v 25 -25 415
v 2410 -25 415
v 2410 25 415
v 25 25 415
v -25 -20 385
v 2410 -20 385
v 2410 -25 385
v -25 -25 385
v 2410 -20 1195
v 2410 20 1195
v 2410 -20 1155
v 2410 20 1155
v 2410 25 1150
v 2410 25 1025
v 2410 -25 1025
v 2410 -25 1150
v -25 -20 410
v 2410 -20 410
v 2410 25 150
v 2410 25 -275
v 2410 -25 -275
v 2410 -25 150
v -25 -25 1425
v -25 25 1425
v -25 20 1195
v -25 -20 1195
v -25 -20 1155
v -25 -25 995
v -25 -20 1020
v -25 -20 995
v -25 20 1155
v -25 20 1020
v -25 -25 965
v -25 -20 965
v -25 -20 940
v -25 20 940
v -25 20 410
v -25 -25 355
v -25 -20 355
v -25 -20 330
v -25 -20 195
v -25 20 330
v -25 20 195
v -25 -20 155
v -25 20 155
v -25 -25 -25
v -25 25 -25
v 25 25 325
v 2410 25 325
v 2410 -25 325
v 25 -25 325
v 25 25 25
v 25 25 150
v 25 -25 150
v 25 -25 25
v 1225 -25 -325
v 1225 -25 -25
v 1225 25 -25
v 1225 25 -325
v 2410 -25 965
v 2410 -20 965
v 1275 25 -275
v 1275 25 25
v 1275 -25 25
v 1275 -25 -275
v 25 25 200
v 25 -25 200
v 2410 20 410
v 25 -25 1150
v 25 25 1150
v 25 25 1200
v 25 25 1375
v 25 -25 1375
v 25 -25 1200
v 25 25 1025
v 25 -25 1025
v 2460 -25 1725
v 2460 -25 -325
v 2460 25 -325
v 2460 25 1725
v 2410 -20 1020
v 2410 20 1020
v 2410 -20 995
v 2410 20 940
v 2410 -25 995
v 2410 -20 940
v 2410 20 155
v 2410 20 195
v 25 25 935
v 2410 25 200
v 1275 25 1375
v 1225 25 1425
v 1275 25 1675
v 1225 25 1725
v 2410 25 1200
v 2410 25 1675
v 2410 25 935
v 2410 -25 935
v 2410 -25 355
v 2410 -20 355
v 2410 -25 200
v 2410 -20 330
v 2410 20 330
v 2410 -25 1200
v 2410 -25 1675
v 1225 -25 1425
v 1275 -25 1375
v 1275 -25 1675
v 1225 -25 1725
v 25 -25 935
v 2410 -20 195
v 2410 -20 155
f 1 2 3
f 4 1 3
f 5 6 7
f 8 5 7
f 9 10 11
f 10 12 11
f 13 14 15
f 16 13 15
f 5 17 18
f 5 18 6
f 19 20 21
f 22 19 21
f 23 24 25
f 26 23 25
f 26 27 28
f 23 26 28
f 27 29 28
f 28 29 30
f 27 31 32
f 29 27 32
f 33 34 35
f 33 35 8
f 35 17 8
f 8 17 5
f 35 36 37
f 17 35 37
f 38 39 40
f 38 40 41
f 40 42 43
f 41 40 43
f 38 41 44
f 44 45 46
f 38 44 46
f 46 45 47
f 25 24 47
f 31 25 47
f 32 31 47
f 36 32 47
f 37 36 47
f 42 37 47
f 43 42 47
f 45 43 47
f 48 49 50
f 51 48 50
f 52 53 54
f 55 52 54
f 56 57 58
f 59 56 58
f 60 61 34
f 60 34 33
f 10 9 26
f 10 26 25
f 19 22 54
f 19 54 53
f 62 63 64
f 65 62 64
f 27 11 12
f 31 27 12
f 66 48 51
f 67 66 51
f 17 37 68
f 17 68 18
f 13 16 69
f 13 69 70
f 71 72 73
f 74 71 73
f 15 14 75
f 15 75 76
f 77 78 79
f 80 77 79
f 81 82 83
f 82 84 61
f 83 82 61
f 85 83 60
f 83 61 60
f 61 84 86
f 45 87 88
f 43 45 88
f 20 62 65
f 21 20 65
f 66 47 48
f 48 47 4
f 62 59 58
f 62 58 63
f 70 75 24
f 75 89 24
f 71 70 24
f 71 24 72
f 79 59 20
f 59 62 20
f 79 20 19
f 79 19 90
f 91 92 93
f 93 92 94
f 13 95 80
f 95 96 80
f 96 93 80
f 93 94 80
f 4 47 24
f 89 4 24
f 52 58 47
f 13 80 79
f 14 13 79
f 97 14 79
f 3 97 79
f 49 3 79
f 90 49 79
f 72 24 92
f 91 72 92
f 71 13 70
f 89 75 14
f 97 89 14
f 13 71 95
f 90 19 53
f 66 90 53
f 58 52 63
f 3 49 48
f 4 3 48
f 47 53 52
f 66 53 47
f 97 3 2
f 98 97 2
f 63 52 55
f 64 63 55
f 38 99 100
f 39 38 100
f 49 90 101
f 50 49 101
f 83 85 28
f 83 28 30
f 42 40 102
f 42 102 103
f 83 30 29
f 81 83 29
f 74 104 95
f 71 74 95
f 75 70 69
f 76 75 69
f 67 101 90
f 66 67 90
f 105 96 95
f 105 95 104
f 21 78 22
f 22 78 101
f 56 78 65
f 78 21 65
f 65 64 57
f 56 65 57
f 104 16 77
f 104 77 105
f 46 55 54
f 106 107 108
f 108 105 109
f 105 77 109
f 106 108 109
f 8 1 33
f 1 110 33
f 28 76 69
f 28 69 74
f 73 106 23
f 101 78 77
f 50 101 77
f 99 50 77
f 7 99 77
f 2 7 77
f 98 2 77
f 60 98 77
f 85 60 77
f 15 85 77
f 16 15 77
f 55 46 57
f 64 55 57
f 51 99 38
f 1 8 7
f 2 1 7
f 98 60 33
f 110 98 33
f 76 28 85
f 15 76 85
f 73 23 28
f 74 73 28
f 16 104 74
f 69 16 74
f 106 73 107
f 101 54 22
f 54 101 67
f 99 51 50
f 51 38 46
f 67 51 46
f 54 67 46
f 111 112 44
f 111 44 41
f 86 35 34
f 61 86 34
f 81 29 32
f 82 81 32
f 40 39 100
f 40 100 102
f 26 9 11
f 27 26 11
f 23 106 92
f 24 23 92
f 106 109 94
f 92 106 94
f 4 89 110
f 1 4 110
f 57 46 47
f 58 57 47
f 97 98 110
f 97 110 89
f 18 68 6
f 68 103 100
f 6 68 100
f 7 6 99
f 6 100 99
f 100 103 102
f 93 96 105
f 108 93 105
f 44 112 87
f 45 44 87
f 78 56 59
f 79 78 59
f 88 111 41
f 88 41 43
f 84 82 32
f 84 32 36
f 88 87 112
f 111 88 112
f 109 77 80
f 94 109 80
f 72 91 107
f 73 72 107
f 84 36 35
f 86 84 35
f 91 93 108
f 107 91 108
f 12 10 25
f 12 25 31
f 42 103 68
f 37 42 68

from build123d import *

# Parameters (mm, degrees)
SKETCH2_W           = 50
SKETCH2_H           = 50
BOSS_EXTRUDE1_DEPTH = 2435
CUT_EXTRUDE1_DEPTH  = 80
SKETCH6_W           = 50
SKETCH6_H           = 50
SKETCH6_W_2         = 40
SKETCH6_H_2         = 40
BOSS_EXTRUDE2_DEPTH = 2435
SKETCH7_W           = 40
SKETCH7_H           = 40
CUT_EXTRUDE2_DEPTH  = 80


with BuildPart() as part:
    # Sweep1: sweep along a path in Sketch1
    with BuildLine(Plane(origin=(0, 0, 0), x_dir=(1, 0, 0), z_dir=(0, 1, 0))) as sweep1_path:
        Line((1250, -1400), (1250, -1700))
        Line((1250, -1700), (2435, -1700))
        Line((2435, -1700), (2435, 300))
        Line((2435, 300), (1250, 300))
        Line((1250, 300), (1250, 0))
        Line((1250, 0), (0, 0))
        Line((0, 0), (0, -1400))
        Line((0, -1400), (1250, -1400))
    # Sketch2 → Sweep1 (sweep)
    with BuildSketch(Plane(origin=(0, 0, 0), x_dir=(0, 0, -1), z_dir=(1, 0, 0))):
        Rectangle(SKETCH2_W, SKETCH2_H)
    sweep(path=sweep1_path.line, transition=Transition.RIGHT)

    # Sketch3 → Boss-Extrude1 (add)
    with BuildSketch(Plane.ZY.offset(25)):
        Polygon((415, 25), (325, 25), (325, -25), (355, -25), (355, -20), (330, -20), (330, 20), (410, 20), (410, -20), (385, -20), (385, -25), (415, -25), align=None)
    boss_extrude1 = extrude(amount=-BOSS_EXTRUDE1_DEPTH)

    # Sketch5 → Cut-Extrude1 (cut)
    with BuildSketch(Plane(origin=(25, 0, 0), x_dir=(0, 0, -1), z_dir=(1, 0, 0))):
        Polygon((-385, -25), (-355, -25), (-355, -20), (-330, -20), (-330, 20), (-410, 20), (-410, -20), (-385, -20), align=None)
    cut_extrude1 = extrude(amount=-CUT_EXTRUDE1_DEPTH, mode=Mode.SUBTRACT)

    # Mirror1: Boss-Extrude1, Cut-Extrude1 across plane
    add(boss_extrude1.mirror(Plane(origin=(0, 0, 675), x_dir=(1, 0, 0), z_dir=(0, 0, -1))))
    add(cut_extrude1.mirror(Plane(origin=(0, 0, 675), x_dir=(1, 0, 0), z_dir=(0, 0, -1))), mode=Mode.SUBTRACT)

    # Sketch6 → Boss-Extrude2 (add)
    with BuildSketch(Plane.ZY.offset(25)):
        with Locations((175, 0)):
            Rectangle(SKETCH6_W, SKETCH6_H)
        with Locations((175, 0)):
            Rectangle(SKETCH6_W_2, SKETCH6_H_2, mode=Mode.SUBTRACT)
    boss_extrude2 = extrude(amount=-BOSS_EXTRUDE2_DEPTH)

    # Sketch7 → Cut-Extrude2 (cut)
    with BuildSketch(Plane.ZY.offset(25)):
        with Locations((175, 0)):
            Rectangle(SKETCH7_W, SKETCH7_H)
    cut_extrude2 = extrude(amount=-CUT_EXTRUDE2_DEPTH, mode=Mode.SUBTRACT)

    # Mirror2: Boss-Extrude2, Cut-Extrude2 across plane
    add(boss_extrude2.mirror(Plane(origin=(0, 0, 675), x_dir=(1, 0, 0), z_dir=(0, 0, -1))))
    add(cut_extrude2.mirror(Plane(origin=(0, 0, 675), x_dir=(1, 0, 0), z_dir=(0, 0, -1))), mode=Mode.SUBTRACT)


solid = part.part
